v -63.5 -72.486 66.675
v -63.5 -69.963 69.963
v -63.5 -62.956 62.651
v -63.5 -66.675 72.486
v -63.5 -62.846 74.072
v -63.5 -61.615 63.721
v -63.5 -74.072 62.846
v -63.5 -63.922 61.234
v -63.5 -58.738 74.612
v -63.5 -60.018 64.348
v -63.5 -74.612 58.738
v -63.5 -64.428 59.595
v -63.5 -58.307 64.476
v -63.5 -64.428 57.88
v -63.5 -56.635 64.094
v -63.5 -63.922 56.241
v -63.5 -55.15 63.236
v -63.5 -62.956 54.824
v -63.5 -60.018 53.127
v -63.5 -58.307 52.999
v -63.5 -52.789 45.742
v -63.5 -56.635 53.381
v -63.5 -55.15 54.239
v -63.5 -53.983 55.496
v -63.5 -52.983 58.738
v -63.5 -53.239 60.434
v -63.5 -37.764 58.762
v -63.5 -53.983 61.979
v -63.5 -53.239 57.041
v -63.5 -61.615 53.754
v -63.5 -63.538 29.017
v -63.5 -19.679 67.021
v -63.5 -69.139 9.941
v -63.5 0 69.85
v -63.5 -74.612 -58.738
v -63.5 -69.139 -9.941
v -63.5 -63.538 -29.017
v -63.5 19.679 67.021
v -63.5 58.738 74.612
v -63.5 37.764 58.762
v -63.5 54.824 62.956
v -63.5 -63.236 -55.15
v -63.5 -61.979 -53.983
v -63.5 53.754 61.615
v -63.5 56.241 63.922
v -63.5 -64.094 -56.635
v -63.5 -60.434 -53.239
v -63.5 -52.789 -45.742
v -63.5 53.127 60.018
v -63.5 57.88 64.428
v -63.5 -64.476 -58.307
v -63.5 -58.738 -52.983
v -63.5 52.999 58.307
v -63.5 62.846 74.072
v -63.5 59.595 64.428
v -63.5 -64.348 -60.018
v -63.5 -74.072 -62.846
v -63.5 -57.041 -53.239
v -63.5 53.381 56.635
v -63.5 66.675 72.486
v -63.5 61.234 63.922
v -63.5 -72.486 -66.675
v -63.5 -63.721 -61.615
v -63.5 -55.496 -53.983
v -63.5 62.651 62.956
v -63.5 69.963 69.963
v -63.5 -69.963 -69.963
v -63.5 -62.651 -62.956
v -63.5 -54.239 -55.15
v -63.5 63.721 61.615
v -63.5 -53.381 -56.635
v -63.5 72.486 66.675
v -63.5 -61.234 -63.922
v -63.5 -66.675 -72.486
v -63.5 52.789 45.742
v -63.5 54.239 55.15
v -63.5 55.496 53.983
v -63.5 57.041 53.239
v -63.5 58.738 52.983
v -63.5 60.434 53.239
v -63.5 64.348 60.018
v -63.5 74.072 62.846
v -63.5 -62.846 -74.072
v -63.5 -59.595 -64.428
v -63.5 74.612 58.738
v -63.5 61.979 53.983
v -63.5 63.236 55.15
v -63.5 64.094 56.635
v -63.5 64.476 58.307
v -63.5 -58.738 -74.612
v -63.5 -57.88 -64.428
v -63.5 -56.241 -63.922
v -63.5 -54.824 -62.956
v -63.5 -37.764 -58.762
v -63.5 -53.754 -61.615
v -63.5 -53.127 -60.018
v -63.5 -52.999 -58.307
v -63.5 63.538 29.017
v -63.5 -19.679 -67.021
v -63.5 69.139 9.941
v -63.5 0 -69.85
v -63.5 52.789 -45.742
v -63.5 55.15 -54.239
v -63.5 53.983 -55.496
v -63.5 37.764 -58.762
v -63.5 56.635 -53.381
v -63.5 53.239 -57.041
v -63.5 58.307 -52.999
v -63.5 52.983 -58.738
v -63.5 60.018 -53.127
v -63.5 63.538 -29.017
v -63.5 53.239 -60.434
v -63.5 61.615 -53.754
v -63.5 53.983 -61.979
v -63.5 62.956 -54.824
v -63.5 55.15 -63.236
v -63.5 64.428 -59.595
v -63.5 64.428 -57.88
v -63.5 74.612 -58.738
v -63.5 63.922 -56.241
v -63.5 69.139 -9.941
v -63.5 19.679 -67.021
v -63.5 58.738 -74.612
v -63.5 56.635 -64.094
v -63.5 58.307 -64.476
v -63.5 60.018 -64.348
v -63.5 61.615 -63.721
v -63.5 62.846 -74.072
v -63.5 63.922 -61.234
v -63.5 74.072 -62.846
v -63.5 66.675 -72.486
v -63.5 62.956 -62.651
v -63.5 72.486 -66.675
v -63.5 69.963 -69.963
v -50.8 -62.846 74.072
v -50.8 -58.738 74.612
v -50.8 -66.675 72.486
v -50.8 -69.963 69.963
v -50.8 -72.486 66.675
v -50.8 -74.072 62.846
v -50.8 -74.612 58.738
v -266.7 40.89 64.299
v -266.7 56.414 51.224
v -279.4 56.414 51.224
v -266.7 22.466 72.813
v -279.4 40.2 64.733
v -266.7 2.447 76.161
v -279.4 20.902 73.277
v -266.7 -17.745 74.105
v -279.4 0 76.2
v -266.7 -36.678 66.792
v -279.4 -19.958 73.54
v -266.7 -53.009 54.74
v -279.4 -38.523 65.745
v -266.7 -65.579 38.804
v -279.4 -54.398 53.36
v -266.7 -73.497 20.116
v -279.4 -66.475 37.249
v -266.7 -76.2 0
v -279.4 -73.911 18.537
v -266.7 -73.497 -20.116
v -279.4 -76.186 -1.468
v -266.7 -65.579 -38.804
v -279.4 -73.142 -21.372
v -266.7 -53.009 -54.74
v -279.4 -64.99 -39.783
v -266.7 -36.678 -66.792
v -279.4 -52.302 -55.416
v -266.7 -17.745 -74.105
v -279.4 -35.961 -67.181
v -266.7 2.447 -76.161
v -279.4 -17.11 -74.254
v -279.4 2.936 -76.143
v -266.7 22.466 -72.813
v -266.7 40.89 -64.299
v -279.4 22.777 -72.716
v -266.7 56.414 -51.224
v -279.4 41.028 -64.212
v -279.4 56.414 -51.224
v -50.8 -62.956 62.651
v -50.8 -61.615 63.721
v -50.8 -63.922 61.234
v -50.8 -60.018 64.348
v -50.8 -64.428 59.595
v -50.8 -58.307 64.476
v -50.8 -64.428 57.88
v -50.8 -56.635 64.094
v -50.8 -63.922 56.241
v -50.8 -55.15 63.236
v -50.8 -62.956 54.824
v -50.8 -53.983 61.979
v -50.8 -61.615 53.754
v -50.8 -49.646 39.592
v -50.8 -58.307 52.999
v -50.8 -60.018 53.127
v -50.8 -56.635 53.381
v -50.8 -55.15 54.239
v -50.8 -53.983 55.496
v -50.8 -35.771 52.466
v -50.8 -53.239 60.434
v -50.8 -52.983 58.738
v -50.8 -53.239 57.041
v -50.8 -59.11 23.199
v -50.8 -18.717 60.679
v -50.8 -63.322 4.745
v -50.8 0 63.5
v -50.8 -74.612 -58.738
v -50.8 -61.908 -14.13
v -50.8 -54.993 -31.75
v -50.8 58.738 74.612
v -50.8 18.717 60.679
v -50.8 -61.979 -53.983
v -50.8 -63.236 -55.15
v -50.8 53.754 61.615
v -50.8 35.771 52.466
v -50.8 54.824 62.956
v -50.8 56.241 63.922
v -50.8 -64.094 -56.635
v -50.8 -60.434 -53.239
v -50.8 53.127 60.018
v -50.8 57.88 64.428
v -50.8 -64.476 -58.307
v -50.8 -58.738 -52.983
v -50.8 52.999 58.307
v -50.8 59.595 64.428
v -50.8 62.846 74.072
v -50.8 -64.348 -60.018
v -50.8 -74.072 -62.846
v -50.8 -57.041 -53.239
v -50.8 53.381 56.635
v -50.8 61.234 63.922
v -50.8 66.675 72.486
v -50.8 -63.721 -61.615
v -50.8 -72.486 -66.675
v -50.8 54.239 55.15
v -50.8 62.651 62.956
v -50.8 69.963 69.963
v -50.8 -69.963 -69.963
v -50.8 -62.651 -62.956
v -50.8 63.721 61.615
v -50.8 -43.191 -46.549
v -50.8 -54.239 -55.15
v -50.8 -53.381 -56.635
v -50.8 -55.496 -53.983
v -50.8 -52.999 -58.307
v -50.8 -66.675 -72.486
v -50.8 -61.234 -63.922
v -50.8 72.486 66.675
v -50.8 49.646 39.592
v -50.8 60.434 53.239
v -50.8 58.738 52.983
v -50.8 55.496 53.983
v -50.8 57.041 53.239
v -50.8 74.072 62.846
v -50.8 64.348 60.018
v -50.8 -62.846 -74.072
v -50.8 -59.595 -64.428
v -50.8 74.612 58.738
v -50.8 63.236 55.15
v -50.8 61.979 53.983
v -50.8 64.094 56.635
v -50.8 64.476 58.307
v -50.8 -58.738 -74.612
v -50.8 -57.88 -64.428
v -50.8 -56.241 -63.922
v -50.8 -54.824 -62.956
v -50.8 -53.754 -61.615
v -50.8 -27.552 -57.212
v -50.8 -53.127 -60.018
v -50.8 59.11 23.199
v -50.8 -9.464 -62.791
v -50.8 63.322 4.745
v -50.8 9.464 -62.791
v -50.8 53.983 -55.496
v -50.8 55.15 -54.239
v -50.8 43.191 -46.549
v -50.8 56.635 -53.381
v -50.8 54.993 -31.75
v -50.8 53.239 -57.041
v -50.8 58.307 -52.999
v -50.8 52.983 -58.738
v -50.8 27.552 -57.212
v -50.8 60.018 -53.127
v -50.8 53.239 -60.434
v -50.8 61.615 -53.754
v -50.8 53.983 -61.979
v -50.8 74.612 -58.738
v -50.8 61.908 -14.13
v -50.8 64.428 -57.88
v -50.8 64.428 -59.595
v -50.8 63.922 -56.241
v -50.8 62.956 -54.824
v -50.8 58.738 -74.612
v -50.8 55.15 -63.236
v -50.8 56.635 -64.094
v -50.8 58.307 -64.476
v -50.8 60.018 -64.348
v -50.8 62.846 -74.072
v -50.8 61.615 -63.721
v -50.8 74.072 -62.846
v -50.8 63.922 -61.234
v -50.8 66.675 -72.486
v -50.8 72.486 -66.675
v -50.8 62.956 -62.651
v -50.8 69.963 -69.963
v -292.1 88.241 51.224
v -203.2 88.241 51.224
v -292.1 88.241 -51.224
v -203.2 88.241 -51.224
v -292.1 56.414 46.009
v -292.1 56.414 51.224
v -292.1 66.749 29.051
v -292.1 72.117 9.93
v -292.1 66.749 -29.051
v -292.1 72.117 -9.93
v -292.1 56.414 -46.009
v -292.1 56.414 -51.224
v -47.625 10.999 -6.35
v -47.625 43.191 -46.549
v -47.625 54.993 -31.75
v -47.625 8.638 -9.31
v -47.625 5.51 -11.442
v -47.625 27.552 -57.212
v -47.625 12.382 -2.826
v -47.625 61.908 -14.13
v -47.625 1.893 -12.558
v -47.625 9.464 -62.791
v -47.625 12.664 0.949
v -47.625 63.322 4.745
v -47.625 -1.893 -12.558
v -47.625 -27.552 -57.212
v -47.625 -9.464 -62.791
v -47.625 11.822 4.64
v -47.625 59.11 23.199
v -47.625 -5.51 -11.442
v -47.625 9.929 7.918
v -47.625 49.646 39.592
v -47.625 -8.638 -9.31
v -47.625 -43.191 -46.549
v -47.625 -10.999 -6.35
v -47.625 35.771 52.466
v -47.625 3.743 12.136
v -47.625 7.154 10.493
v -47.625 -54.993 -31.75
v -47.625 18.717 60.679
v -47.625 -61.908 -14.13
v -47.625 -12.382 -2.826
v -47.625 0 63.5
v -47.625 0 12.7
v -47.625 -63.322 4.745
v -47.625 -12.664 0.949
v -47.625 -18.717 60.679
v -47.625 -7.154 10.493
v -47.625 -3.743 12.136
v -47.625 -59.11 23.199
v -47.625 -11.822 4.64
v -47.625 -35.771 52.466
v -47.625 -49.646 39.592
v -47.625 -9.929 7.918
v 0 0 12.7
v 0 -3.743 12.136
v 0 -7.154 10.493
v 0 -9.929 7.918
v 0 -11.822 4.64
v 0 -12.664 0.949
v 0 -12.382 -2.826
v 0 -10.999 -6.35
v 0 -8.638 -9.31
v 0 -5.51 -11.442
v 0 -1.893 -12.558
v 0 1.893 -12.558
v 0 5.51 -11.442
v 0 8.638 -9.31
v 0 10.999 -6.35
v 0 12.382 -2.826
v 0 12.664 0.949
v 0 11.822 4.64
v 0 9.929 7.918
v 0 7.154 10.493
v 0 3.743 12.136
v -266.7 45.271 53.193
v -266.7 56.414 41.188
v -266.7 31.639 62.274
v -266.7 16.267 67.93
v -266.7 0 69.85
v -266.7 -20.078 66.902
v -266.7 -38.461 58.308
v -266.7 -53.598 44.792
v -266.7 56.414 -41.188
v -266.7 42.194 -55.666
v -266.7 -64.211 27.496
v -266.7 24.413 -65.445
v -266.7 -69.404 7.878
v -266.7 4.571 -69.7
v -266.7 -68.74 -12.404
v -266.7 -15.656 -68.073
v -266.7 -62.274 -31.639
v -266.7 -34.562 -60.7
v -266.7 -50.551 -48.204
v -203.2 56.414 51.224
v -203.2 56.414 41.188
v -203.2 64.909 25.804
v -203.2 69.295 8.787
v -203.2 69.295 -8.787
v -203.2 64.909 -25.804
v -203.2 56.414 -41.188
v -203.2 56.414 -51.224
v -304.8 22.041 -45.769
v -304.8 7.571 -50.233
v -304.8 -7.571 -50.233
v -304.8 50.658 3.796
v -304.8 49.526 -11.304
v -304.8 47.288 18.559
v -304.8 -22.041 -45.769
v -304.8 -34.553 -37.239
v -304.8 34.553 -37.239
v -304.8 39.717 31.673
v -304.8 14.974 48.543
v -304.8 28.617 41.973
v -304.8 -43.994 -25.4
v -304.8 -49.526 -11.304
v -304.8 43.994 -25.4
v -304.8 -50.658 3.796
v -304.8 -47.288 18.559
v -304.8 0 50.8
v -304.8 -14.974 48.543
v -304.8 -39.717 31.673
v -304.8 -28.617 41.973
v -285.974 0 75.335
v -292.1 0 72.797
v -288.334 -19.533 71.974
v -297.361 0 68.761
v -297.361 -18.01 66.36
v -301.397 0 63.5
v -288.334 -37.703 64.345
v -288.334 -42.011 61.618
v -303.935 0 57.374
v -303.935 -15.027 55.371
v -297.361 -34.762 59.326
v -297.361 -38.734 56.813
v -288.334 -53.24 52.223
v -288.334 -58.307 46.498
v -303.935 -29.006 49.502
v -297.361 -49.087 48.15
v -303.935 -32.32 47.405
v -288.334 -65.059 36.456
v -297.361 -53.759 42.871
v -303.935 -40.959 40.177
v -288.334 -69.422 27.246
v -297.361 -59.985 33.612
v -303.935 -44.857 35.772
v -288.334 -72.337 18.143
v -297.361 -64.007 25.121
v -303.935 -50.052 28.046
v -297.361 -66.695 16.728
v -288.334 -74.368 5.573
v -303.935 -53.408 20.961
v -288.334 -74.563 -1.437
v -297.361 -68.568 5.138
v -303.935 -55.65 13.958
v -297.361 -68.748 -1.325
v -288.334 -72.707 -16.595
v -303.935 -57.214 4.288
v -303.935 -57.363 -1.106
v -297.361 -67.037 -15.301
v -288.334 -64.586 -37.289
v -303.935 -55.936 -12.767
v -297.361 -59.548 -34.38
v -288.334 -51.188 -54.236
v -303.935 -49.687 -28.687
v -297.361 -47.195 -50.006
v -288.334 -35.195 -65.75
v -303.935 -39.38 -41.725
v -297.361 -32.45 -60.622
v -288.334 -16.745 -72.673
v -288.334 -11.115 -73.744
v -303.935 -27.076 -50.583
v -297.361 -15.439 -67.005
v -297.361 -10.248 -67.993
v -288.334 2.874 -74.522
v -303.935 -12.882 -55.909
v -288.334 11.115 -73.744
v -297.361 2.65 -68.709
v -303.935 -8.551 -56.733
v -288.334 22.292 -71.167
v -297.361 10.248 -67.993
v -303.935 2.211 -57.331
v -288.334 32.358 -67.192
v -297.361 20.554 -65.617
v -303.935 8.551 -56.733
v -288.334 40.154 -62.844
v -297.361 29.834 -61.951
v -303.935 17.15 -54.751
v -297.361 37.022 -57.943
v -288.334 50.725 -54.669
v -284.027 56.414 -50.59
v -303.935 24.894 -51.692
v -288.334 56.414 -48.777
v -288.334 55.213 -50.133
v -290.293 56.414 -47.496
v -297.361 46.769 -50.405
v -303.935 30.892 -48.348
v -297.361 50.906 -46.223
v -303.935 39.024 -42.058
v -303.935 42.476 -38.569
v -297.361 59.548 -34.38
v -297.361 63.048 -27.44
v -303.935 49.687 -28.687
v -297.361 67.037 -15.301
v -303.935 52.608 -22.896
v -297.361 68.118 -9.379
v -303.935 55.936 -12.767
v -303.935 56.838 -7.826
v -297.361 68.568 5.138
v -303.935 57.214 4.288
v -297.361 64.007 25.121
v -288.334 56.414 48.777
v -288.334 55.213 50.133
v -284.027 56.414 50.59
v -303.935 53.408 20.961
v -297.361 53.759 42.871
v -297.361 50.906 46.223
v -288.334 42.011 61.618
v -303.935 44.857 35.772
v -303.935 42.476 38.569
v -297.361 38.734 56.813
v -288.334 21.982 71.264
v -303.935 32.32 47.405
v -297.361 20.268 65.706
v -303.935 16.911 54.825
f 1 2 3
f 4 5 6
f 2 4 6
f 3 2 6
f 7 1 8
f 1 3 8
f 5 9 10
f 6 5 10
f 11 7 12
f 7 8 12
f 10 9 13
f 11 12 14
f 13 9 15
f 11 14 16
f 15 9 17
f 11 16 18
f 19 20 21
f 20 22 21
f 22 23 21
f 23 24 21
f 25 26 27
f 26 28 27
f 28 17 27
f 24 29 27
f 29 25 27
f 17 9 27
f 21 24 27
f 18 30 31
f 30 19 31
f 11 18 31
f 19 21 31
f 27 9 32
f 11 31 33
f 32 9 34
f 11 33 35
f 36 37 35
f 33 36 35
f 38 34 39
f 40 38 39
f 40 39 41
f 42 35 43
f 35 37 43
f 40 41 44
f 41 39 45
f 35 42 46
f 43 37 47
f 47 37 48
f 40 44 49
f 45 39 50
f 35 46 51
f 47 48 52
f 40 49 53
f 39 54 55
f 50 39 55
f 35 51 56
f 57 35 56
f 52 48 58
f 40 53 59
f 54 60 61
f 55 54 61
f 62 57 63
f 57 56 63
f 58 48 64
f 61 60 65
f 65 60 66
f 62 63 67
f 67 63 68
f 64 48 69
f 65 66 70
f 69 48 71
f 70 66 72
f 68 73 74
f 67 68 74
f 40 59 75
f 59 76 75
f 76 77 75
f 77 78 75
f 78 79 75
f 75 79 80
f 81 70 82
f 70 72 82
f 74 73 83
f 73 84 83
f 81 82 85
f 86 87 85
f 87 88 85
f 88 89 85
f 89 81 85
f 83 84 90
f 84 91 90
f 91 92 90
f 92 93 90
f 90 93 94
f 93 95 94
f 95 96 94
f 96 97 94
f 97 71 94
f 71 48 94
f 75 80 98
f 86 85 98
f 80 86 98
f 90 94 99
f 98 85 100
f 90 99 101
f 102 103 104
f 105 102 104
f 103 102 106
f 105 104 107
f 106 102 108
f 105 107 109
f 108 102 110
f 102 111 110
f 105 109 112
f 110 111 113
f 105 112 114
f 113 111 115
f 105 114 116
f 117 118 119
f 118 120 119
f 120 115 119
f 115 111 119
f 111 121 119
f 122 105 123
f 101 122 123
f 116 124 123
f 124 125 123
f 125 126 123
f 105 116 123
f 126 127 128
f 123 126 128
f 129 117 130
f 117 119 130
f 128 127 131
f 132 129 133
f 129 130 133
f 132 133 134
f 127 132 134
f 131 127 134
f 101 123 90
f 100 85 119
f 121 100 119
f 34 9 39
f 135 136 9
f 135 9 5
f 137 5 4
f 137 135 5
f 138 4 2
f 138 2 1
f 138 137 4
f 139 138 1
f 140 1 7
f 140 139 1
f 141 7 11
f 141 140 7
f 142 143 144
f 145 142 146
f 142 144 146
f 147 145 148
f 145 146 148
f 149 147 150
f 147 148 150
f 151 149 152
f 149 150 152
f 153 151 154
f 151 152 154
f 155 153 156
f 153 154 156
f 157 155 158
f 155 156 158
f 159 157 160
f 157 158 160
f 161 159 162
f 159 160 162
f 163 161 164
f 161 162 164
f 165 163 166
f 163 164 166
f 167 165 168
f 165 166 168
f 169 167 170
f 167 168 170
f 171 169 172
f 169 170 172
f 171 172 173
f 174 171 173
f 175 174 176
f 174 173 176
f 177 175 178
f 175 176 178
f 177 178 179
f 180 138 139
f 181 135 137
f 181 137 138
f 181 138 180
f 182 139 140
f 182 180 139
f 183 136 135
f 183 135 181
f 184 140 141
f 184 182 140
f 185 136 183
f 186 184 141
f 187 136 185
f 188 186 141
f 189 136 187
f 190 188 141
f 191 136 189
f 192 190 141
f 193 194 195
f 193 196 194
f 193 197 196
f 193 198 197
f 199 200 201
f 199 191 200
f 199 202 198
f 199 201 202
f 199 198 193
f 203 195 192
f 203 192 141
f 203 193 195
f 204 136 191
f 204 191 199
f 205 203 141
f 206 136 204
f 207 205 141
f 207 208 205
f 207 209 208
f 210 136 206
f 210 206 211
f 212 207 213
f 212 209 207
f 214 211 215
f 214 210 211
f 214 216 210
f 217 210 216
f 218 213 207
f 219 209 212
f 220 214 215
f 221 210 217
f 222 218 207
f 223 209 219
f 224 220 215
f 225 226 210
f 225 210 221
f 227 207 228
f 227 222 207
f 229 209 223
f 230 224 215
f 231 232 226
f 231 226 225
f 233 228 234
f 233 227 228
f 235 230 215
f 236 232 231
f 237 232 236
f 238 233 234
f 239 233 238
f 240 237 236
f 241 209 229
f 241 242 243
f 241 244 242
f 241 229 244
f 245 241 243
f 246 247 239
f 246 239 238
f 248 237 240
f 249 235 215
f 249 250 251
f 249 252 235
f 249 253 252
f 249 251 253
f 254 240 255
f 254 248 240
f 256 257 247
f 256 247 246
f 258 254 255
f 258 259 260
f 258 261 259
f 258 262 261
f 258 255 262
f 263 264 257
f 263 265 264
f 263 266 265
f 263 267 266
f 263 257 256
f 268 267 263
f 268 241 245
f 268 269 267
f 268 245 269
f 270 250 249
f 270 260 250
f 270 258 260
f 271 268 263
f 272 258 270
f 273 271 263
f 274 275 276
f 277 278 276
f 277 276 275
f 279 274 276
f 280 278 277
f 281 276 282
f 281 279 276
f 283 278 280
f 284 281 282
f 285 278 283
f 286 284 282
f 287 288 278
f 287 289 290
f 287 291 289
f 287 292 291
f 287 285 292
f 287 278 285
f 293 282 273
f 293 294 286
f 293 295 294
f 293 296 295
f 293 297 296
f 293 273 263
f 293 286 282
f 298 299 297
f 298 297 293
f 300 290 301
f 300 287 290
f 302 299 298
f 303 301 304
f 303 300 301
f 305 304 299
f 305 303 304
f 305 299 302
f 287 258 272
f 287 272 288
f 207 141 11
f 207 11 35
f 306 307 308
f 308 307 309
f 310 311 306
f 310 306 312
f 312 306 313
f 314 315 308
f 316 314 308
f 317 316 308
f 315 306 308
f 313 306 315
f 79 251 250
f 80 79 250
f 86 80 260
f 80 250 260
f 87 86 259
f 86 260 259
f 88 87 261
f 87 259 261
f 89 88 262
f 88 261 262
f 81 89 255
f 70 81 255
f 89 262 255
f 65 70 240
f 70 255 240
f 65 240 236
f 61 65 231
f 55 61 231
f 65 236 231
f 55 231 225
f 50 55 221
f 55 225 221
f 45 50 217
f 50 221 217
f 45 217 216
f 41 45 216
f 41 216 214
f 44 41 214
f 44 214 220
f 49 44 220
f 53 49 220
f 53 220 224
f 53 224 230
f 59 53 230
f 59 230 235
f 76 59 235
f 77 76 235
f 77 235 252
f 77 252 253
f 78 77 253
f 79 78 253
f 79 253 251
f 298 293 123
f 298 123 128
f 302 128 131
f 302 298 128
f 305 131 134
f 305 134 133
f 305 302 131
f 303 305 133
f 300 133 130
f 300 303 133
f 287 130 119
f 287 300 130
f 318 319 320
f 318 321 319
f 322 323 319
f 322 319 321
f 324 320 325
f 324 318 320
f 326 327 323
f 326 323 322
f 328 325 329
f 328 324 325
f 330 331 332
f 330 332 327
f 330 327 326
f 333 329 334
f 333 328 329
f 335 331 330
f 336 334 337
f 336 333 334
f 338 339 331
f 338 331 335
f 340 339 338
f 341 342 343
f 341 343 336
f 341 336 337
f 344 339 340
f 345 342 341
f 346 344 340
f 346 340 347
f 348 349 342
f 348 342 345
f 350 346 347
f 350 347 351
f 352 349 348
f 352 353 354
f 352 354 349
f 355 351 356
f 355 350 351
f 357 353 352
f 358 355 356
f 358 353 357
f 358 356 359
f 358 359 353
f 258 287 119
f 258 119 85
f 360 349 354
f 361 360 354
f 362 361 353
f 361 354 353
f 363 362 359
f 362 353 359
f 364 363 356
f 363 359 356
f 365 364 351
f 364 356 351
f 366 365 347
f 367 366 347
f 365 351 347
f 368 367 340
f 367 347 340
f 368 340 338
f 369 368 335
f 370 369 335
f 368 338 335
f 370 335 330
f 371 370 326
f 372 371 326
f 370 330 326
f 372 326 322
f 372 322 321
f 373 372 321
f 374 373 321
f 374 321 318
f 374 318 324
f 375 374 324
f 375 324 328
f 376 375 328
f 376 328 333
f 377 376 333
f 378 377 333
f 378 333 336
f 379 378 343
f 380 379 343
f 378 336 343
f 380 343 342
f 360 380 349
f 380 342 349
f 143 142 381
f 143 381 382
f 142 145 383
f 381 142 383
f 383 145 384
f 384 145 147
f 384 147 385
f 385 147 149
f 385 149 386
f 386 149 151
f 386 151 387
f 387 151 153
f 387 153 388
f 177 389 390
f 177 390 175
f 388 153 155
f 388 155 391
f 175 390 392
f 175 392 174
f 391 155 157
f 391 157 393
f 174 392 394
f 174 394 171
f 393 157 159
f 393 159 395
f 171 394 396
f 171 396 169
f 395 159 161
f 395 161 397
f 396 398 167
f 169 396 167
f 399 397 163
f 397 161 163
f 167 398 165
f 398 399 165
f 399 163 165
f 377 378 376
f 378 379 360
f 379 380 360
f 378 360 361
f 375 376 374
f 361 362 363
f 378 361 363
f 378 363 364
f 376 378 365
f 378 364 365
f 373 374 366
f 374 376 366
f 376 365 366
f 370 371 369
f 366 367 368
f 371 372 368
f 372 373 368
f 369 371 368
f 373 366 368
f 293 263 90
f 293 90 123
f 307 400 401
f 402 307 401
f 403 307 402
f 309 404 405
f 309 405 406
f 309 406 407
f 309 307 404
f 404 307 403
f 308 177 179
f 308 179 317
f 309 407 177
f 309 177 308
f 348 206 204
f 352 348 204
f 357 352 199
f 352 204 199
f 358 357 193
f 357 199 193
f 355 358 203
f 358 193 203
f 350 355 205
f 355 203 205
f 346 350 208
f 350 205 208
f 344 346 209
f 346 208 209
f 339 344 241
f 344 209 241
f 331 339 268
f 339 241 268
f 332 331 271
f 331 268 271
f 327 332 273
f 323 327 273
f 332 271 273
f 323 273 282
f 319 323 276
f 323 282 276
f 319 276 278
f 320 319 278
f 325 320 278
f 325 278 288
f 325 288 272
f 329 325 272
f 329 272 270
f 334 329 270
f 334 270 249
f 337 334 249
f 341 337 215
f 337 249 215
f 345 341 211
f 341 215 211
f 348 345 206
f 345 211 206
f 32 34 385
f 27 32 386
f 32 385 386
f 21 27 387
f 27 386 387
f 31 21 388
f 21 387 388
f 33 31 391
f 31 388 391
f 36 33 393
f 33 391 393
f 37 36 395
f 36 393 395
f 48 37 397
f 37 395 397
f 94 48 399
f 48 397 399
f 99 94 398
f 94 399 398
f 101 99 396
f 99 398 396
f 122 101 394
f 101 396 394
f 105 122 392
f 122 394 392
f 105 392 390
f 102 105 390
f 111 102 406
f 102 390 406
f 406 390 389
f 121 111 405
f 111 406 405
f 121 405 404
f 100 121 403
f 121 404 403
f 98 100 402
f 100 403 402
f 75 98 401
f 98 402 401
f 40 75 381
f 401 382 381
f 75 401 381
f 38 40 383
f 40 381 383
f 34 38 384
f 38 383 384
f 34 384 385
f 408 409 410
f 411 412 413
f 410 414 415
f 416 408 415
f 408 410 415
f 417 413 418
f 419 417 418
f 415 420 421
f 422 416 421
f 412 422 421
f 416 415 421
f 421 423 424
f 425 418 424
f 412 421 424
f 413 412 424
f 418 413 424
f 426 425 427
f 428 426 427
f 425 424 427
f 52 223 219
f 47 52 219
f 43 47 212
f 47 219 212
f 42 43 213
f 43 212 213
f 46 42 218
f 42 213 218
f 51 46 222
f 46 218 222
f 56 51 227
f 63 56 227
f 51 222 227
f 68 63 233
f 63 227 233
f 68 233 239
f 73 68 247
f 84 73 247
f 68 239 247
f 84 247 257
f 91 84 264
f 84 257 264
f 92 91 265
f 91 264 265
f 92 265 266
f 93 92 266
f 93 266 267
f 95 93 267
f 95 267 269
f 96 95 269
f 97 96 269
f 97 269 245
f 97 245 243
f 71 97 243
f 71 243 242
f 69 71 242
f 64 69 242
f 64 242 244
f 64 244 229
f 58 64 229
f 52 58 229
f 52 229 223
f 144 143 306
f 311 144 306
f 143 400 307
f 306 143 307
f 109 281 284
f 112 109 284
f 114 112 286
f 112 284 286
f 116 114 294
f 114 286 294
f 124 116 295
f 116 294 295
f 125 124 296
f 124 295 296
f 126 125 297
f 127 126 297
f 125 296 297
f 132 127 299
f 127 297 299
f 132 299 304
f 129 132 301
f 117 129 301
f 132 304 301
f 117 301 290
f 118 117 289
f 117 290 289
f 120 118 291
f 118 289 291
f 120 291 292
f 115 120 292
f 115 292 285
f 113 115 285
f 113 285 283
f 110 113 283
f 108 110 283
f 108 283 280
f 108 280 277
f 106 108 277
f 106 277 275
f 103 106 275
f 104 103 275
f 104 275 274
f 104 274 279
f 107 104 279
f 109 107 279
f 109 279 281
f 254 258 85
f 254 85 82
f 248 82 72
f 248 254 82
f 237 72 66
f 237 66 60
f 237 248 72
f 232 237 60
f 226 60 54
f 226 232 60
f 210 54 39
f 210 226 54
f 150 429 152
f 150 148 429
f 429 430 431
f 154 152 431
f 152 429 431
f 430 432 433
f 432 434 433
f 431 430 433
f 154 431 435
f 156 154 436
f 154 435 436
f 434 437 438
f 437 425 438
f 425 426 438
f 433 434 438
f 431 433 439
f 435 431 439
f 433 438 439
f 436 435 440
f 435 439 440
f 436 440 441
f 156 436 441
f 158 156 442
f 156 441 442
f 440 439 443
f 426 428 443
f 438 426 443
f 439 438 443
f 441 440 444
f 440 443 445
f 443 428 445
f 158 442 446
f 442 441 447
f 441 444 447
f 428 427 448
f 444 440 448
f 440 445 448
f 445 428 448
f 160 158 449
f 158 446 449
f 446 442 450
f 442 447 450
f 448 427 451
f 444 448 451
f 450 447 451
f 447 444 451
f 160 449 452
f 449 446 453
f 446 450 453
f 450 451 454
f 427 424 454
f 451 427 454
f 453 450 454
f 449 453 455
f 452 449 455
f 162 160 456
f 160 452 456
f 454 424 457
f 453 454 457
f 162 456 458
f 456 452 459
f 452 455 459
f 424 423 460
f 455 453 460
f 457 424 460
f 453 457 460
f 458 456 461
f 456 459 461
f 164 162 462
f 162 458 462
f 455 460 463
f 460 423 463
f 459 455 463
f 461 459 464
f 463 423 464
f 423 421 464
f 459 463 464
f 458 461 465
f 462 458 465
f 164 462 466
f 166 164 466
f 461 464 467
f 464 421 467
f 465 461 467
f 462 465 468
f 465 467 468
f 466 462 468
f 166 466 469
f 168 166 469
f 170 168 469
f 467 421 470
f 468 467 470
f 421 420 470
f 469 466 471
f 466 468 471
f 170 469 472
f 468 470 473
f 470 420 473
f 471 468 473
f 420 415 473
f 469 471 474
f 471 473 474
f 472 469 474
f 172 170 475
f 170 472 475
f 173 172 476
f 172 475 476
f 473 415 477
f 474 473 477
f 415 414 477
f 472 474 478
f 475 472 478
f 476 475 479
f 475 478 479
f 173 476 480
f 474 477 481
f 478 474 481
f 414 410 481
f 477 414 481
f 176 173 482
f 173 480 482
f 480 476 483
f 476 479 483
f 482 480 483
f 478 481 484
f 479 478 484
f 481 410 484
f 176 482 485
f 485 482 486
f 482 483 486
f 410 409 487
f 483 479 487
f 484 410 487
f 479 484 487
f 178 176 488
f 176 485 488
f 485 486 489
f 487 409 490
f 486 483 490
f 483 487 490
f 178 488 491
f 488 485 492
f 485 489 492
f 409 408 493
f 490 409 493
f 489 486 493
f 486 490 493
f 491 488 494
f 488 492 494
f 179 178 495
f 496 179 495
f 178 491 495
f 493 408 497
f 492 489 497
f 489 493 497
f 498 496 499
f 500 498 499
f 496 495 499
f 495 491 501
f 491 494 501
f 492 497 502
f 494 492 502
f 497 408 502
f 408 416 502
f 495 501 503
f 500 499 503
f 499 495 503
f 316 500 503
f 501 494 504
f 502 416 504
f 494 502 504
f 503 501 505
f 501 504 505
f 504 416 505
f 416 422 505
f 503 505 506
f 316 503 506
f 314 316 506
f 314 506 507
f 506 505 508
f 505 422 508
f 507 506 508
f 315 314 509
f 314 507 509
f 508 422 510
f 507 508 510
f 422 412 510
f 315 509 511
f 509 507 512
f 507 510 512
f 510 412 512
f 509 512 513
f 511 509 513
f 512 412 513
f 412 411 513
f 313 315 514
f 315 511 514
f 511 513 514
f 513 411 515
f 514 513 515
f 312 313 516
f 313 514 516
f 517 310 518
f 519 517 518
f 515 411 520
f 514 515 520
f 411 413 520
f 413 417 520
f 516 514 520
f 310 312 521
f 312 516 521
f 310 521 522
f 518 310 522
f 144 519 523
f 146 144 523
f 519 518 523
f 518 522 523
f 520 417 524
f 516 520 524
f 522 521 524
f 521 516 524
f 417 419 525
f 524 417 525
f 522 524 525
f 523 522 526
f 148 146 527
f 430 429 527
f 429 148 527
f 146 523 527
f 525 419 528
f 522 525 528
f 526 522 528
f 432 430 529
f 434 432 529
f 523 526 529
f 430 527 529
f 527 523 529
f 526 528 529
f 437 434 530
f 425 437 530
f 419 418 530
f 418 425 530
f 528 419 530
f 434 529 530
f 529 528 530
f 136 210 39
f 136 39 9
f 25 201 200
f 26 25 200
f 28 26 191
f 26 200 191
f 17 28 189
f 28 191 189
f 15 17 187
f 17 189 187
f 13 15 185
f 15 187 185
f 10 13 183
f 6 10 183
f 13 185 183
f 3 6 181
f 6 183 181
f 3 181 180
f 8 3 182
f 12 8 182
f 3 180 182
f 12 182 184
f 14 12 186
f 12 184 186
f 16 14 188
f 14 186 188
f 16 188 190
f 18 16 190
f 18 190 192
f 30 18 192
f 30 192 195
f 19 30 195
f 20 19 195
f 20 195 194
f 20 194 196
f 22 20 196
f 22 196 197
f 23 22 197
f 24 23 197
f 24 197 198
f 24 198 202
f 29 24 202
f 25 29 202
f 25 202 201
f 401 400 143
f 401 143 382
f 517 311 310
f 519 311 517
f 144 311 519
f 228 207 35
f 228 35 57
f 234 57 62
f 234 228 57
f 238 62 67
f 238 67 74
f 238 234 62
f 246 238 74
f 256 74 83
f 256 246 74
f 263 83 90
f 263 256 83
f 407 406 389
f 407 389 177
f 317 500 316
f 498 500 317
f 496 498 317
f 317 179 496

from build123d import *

# Parameters (mm, degrees)
BOSS_EXTRUDE1_DEPTH     = 12.7
SKETCH3_W               = 102.447825146
SKETCH3_H               = 31.827107341
BOSS_EXTRUDE2_DEPTH     = 88.9
SKETCH4_R               = 63.5
PILOT_DIA_DEPTH         = 3.175
F_1_2_20_TAPPED_HOLE2_D = 11.50874
CIRPATTERN2_COUNT       = 4


with BuildPart() as part:
    # Sketch1 → Base-Revolve (revolve)
    with BuildSketch(Plane.XY, mode=Mode.PRIVATE) as base_revolve_sk:
        with BuildLine():
            Line((0, 0), (0, 12.7))
            Line((0, 12.7), (-50.8, 12.7))
            Line((-50.8, 12.7), (-50.8, 69.85))
            Line((-50.8, 69.85), (-266.7, 69.85))
            Line((-266.7, 69.85), (-266.7, 76.2))
            Line((-266.7, 76.2), (-279.4, 76.2))
            ThreePointArc((-279.4, 76.2), (-297.360512242, 68.760512242), (-304.8, 50.8))
            Line((-304.8, 50.8), (-304.8, 0))
            Line((-304.8, 0), (0, 0))
        make_face()
    revolve(base_revolve_sk.sketch.rotate(Axis((0, 0, 0), (1, 0, 0)), 90), axis=Axis((0, 0, 0), (1, 0, 0)))

    # Sketch2 → Boss-Extrude1 (add)
    with BuildSketch(Plane(origin=(-50.8, 0, 0), x_dir=(0, 0, -1), z_dir=(1, 0, 0))):
        with BuildLine():
            Line((74.6125, -58.7375), (74.6125, 58.7375))
            ThreePointArc((74.6125, 58.7375), (69.962820151, 69.962820151), (58.7375, 74.6125))
            Line((58.7375, 74.6125), (-58.7375, 74.6125))
            ThreePointArc((-58.7375, 74.6125), (-69.962820151, 69.962820151), (-74.6125, 58.7375))
            Line((-74.6125, 58.7375), (-74.6125, -58.7375))
            ThreePointArc((-74.6125, -58.7375), (-69.962820151, -69.962820151), (-58.7375, -74.6125))
            Line((-58.7375, -74.6125), (58.7375, -74.6125))
            ThreePointArc((58.7375, -74.6125), (69.962820151, -69.962820151), (74.6125, -58.7375))
        make_face()
    extrude(amount=-BOSS_EXTRUDE1_DEPTH)

    # Sketch3 → Boss-Extrude2 (add)
    with BuildSketch(Plane(origin=(-203.2, 0, 0), x_dir=(0, 0, -1), z_dir=(1, 0, 0))):
        with Locations((0, 72.327654574)):
            Rectangle(SKETCH3_W, SKETCH3_H)
    extrude(amount=-BOSS_EXTRUDE2_DEPTH)

    # Sketch4 → pilot dia (add)
    with BuildSketch(Plane(origin=(-50.8, 0, 0), x_dir=(0, 0, -1), z_dir=(1, 0, 0))):
        with Locations(Location((0, 0, 0), (0, 0, 180))):
            Circle(SKETCH4_R)
    extrude(amount=PILOT_DIA_DEPTH)

    # 1/2-20 Tapped Hole2 (through all)
    with Locations(Plane.ZY.offset(63.5)):
        with Locations((58.7375, 58.7375)):
            f_1_2_20_tapped_hole2 = Hole(F_1_2_20_TAPPED_HOLE2_D / 2)

    # CirPattern2: 1/2-20 Tapped Hole2 ×4 about axis
    cirpattern2_axis = Axis((0, 0, 0), (1, 0, 0))
    for i in range(1, CIRPATTERN2_COUNT):
        add(f_1_2_20_tapped_hole2.rotate(cirpattern2_axis, i * 360 / CIRPATTERN2_COUNT), mode=Mode.SUBTRACT)


solid = part.part
